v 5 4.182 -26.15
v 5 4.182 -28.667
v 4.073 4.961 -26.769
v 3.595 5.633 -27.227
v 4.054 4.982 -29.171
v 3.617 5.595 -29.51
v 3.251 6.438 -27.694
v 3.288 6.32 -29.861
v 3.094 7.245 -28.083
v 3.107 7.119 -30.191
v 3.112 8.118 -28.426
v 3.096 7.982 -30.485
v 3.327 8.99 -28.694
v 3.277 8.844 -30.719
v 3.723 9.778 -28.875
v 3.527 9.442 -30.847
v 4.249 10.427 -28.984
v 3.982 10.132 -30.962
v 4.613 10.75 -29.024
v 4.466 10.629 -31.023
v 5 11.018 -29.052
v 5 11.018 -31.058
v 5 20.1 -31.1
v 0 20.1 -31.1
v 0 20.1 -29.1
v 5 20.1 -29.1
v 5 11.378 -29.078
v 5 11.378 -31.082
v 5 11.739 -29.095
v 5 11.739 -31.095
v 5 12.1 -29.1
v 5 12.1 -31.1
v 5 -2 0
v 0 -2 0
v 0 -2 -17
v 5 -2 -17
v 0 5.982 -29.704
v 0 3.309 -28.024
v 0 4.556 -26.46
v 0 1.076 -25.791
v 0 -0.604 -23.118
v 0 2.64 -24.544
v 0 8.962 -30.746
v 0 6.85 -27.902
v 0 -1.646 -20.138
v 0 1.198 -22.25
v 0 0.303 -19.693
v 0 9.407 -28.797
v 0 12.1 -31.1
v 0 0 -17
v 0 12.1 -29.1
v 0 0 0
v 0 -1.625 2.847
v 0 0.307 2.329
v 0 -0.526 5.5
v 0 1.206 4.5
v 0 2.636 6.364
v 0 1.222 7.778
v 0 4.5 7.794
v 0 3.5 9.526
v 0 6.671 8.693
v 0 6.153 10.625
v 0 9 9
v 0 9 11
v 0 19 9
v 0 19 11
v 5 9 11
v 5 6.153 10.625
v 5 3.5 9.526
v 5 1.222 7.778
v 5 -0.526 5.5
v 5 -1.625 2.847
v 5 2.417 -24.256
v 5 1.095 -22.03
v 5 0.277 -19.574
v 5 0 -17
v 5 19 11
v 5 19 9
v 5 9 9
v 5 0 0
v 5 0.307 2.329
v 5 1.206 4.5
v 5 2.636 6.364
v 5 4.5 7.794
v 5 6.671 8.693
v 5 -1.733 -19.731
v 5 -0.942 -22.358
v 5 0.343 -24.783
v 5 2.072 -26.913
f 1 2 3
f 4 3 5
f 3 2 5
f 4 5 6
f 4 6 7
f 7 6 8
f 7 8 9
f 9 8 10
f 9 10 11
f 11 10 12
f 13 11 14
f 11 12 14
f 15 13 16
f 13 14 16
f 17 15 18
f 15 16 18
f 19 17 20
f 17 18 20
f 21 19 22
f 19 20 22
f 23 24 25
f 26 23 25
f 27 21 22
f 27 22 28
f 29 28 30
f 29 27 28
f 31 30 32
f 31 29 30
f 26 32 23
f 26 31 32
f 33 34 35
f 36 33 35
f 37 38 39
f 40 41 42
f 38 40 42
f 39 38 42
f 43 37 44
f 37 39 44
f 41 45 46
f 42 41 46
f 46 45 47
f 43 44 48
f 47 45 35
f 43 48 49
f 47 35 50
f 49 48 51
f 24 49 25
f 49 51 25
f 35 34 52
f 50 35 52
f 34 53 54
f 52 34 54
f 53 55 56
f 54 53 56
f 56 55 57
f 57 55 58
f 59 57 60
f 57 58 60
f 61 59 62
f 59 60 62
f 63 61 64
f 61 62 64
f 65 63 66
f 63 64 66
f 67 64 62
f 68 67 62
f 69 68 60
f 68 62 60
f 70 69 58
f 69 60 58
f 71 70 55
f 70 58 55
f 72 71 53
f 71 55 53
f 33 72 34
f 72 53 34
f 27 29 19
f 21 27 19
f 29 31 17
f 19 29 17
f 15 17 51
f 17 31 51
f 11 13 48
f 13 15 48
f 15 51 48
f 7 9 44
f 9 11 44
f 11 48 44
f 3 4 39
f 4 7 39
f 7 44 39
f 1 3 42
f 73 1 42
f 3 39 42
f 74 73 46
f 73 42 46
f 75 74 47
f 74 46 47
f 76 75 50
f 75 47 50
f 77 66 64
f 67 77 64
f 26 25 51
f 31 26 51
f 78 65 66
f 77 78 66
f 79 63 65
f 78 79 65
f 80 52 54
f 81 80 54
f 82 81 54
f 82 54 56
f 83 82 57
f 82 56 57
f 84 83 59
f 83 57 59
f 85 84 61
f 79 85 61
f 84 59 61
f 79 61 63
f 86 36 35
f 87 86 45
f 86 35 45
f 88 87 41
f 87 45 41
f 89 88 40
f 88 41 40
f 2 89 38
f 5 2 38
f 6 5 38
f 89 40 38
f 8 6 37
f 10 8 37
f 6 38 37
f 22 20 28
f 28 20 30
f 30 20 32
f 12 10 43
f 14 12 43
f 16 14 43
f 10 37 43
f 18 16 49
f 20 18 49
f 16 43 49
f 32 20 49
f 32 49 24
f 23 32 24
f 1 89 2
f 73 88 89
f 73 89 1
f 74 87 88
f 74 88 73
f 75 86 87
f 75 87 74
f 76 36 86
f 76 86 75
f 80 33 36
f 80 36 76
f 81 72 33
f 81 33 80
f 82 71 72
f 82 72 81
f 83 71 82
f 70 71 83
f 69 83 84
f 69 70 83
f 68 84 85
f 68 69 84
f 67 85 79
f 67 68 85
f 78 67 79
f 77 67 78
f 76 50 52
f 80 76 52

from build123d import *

# Parameters (mm, degrees)
F1_DEPTH = 5
F2_R     = 4
F3_DEPTH = 10


with BuildPart() as f1:
    # F0 (on Right) → F1 (new body)
    with BuildSketch(Plane.YZ):
        with BuildLine():
            Line((9, 9), (19, 9))
            Line((19, 9), (19, 11))
            Line((19, 11), (9, 11))
            ThreePointArc((9, 11), (1.221825, 7.778175), (-2, 0))
            Line((-2, 0), (-2, -17))
            ThreePointArc((-2, -17), (2.129794, -26.970206), (12.1, -31.1))
            Line((12.1, -31.1), (20.1, -31.1))
            Line((20.1, -31.1), (20.1, -29.1))
            Line((20.1, -29.1), (12.1, -29.1))
            ThreePointArc((12.1, -29.1), (3.544008, -25.555992), (0, -17))
            Line((0, -17), (0, 0))
            ThreePointArc((0, 0), (2.636039, 6.363961), (9, 9))
        make_face()
    extrude(amount=F1_DEPTH)

    # F2 (on face) → F3 (cut)
    with BuildSketch(Plane(origin=(0, 0, -31.1), x_dir=(1, 0, 0), z_dir=(0, 0, -1))):
        with Locations((7.078093, -7.6)):
            Circle(F2_R)
    extrude(amount=-F3_DEPTH, mode=Mode.SUBTRACT)


solid = f1.part
